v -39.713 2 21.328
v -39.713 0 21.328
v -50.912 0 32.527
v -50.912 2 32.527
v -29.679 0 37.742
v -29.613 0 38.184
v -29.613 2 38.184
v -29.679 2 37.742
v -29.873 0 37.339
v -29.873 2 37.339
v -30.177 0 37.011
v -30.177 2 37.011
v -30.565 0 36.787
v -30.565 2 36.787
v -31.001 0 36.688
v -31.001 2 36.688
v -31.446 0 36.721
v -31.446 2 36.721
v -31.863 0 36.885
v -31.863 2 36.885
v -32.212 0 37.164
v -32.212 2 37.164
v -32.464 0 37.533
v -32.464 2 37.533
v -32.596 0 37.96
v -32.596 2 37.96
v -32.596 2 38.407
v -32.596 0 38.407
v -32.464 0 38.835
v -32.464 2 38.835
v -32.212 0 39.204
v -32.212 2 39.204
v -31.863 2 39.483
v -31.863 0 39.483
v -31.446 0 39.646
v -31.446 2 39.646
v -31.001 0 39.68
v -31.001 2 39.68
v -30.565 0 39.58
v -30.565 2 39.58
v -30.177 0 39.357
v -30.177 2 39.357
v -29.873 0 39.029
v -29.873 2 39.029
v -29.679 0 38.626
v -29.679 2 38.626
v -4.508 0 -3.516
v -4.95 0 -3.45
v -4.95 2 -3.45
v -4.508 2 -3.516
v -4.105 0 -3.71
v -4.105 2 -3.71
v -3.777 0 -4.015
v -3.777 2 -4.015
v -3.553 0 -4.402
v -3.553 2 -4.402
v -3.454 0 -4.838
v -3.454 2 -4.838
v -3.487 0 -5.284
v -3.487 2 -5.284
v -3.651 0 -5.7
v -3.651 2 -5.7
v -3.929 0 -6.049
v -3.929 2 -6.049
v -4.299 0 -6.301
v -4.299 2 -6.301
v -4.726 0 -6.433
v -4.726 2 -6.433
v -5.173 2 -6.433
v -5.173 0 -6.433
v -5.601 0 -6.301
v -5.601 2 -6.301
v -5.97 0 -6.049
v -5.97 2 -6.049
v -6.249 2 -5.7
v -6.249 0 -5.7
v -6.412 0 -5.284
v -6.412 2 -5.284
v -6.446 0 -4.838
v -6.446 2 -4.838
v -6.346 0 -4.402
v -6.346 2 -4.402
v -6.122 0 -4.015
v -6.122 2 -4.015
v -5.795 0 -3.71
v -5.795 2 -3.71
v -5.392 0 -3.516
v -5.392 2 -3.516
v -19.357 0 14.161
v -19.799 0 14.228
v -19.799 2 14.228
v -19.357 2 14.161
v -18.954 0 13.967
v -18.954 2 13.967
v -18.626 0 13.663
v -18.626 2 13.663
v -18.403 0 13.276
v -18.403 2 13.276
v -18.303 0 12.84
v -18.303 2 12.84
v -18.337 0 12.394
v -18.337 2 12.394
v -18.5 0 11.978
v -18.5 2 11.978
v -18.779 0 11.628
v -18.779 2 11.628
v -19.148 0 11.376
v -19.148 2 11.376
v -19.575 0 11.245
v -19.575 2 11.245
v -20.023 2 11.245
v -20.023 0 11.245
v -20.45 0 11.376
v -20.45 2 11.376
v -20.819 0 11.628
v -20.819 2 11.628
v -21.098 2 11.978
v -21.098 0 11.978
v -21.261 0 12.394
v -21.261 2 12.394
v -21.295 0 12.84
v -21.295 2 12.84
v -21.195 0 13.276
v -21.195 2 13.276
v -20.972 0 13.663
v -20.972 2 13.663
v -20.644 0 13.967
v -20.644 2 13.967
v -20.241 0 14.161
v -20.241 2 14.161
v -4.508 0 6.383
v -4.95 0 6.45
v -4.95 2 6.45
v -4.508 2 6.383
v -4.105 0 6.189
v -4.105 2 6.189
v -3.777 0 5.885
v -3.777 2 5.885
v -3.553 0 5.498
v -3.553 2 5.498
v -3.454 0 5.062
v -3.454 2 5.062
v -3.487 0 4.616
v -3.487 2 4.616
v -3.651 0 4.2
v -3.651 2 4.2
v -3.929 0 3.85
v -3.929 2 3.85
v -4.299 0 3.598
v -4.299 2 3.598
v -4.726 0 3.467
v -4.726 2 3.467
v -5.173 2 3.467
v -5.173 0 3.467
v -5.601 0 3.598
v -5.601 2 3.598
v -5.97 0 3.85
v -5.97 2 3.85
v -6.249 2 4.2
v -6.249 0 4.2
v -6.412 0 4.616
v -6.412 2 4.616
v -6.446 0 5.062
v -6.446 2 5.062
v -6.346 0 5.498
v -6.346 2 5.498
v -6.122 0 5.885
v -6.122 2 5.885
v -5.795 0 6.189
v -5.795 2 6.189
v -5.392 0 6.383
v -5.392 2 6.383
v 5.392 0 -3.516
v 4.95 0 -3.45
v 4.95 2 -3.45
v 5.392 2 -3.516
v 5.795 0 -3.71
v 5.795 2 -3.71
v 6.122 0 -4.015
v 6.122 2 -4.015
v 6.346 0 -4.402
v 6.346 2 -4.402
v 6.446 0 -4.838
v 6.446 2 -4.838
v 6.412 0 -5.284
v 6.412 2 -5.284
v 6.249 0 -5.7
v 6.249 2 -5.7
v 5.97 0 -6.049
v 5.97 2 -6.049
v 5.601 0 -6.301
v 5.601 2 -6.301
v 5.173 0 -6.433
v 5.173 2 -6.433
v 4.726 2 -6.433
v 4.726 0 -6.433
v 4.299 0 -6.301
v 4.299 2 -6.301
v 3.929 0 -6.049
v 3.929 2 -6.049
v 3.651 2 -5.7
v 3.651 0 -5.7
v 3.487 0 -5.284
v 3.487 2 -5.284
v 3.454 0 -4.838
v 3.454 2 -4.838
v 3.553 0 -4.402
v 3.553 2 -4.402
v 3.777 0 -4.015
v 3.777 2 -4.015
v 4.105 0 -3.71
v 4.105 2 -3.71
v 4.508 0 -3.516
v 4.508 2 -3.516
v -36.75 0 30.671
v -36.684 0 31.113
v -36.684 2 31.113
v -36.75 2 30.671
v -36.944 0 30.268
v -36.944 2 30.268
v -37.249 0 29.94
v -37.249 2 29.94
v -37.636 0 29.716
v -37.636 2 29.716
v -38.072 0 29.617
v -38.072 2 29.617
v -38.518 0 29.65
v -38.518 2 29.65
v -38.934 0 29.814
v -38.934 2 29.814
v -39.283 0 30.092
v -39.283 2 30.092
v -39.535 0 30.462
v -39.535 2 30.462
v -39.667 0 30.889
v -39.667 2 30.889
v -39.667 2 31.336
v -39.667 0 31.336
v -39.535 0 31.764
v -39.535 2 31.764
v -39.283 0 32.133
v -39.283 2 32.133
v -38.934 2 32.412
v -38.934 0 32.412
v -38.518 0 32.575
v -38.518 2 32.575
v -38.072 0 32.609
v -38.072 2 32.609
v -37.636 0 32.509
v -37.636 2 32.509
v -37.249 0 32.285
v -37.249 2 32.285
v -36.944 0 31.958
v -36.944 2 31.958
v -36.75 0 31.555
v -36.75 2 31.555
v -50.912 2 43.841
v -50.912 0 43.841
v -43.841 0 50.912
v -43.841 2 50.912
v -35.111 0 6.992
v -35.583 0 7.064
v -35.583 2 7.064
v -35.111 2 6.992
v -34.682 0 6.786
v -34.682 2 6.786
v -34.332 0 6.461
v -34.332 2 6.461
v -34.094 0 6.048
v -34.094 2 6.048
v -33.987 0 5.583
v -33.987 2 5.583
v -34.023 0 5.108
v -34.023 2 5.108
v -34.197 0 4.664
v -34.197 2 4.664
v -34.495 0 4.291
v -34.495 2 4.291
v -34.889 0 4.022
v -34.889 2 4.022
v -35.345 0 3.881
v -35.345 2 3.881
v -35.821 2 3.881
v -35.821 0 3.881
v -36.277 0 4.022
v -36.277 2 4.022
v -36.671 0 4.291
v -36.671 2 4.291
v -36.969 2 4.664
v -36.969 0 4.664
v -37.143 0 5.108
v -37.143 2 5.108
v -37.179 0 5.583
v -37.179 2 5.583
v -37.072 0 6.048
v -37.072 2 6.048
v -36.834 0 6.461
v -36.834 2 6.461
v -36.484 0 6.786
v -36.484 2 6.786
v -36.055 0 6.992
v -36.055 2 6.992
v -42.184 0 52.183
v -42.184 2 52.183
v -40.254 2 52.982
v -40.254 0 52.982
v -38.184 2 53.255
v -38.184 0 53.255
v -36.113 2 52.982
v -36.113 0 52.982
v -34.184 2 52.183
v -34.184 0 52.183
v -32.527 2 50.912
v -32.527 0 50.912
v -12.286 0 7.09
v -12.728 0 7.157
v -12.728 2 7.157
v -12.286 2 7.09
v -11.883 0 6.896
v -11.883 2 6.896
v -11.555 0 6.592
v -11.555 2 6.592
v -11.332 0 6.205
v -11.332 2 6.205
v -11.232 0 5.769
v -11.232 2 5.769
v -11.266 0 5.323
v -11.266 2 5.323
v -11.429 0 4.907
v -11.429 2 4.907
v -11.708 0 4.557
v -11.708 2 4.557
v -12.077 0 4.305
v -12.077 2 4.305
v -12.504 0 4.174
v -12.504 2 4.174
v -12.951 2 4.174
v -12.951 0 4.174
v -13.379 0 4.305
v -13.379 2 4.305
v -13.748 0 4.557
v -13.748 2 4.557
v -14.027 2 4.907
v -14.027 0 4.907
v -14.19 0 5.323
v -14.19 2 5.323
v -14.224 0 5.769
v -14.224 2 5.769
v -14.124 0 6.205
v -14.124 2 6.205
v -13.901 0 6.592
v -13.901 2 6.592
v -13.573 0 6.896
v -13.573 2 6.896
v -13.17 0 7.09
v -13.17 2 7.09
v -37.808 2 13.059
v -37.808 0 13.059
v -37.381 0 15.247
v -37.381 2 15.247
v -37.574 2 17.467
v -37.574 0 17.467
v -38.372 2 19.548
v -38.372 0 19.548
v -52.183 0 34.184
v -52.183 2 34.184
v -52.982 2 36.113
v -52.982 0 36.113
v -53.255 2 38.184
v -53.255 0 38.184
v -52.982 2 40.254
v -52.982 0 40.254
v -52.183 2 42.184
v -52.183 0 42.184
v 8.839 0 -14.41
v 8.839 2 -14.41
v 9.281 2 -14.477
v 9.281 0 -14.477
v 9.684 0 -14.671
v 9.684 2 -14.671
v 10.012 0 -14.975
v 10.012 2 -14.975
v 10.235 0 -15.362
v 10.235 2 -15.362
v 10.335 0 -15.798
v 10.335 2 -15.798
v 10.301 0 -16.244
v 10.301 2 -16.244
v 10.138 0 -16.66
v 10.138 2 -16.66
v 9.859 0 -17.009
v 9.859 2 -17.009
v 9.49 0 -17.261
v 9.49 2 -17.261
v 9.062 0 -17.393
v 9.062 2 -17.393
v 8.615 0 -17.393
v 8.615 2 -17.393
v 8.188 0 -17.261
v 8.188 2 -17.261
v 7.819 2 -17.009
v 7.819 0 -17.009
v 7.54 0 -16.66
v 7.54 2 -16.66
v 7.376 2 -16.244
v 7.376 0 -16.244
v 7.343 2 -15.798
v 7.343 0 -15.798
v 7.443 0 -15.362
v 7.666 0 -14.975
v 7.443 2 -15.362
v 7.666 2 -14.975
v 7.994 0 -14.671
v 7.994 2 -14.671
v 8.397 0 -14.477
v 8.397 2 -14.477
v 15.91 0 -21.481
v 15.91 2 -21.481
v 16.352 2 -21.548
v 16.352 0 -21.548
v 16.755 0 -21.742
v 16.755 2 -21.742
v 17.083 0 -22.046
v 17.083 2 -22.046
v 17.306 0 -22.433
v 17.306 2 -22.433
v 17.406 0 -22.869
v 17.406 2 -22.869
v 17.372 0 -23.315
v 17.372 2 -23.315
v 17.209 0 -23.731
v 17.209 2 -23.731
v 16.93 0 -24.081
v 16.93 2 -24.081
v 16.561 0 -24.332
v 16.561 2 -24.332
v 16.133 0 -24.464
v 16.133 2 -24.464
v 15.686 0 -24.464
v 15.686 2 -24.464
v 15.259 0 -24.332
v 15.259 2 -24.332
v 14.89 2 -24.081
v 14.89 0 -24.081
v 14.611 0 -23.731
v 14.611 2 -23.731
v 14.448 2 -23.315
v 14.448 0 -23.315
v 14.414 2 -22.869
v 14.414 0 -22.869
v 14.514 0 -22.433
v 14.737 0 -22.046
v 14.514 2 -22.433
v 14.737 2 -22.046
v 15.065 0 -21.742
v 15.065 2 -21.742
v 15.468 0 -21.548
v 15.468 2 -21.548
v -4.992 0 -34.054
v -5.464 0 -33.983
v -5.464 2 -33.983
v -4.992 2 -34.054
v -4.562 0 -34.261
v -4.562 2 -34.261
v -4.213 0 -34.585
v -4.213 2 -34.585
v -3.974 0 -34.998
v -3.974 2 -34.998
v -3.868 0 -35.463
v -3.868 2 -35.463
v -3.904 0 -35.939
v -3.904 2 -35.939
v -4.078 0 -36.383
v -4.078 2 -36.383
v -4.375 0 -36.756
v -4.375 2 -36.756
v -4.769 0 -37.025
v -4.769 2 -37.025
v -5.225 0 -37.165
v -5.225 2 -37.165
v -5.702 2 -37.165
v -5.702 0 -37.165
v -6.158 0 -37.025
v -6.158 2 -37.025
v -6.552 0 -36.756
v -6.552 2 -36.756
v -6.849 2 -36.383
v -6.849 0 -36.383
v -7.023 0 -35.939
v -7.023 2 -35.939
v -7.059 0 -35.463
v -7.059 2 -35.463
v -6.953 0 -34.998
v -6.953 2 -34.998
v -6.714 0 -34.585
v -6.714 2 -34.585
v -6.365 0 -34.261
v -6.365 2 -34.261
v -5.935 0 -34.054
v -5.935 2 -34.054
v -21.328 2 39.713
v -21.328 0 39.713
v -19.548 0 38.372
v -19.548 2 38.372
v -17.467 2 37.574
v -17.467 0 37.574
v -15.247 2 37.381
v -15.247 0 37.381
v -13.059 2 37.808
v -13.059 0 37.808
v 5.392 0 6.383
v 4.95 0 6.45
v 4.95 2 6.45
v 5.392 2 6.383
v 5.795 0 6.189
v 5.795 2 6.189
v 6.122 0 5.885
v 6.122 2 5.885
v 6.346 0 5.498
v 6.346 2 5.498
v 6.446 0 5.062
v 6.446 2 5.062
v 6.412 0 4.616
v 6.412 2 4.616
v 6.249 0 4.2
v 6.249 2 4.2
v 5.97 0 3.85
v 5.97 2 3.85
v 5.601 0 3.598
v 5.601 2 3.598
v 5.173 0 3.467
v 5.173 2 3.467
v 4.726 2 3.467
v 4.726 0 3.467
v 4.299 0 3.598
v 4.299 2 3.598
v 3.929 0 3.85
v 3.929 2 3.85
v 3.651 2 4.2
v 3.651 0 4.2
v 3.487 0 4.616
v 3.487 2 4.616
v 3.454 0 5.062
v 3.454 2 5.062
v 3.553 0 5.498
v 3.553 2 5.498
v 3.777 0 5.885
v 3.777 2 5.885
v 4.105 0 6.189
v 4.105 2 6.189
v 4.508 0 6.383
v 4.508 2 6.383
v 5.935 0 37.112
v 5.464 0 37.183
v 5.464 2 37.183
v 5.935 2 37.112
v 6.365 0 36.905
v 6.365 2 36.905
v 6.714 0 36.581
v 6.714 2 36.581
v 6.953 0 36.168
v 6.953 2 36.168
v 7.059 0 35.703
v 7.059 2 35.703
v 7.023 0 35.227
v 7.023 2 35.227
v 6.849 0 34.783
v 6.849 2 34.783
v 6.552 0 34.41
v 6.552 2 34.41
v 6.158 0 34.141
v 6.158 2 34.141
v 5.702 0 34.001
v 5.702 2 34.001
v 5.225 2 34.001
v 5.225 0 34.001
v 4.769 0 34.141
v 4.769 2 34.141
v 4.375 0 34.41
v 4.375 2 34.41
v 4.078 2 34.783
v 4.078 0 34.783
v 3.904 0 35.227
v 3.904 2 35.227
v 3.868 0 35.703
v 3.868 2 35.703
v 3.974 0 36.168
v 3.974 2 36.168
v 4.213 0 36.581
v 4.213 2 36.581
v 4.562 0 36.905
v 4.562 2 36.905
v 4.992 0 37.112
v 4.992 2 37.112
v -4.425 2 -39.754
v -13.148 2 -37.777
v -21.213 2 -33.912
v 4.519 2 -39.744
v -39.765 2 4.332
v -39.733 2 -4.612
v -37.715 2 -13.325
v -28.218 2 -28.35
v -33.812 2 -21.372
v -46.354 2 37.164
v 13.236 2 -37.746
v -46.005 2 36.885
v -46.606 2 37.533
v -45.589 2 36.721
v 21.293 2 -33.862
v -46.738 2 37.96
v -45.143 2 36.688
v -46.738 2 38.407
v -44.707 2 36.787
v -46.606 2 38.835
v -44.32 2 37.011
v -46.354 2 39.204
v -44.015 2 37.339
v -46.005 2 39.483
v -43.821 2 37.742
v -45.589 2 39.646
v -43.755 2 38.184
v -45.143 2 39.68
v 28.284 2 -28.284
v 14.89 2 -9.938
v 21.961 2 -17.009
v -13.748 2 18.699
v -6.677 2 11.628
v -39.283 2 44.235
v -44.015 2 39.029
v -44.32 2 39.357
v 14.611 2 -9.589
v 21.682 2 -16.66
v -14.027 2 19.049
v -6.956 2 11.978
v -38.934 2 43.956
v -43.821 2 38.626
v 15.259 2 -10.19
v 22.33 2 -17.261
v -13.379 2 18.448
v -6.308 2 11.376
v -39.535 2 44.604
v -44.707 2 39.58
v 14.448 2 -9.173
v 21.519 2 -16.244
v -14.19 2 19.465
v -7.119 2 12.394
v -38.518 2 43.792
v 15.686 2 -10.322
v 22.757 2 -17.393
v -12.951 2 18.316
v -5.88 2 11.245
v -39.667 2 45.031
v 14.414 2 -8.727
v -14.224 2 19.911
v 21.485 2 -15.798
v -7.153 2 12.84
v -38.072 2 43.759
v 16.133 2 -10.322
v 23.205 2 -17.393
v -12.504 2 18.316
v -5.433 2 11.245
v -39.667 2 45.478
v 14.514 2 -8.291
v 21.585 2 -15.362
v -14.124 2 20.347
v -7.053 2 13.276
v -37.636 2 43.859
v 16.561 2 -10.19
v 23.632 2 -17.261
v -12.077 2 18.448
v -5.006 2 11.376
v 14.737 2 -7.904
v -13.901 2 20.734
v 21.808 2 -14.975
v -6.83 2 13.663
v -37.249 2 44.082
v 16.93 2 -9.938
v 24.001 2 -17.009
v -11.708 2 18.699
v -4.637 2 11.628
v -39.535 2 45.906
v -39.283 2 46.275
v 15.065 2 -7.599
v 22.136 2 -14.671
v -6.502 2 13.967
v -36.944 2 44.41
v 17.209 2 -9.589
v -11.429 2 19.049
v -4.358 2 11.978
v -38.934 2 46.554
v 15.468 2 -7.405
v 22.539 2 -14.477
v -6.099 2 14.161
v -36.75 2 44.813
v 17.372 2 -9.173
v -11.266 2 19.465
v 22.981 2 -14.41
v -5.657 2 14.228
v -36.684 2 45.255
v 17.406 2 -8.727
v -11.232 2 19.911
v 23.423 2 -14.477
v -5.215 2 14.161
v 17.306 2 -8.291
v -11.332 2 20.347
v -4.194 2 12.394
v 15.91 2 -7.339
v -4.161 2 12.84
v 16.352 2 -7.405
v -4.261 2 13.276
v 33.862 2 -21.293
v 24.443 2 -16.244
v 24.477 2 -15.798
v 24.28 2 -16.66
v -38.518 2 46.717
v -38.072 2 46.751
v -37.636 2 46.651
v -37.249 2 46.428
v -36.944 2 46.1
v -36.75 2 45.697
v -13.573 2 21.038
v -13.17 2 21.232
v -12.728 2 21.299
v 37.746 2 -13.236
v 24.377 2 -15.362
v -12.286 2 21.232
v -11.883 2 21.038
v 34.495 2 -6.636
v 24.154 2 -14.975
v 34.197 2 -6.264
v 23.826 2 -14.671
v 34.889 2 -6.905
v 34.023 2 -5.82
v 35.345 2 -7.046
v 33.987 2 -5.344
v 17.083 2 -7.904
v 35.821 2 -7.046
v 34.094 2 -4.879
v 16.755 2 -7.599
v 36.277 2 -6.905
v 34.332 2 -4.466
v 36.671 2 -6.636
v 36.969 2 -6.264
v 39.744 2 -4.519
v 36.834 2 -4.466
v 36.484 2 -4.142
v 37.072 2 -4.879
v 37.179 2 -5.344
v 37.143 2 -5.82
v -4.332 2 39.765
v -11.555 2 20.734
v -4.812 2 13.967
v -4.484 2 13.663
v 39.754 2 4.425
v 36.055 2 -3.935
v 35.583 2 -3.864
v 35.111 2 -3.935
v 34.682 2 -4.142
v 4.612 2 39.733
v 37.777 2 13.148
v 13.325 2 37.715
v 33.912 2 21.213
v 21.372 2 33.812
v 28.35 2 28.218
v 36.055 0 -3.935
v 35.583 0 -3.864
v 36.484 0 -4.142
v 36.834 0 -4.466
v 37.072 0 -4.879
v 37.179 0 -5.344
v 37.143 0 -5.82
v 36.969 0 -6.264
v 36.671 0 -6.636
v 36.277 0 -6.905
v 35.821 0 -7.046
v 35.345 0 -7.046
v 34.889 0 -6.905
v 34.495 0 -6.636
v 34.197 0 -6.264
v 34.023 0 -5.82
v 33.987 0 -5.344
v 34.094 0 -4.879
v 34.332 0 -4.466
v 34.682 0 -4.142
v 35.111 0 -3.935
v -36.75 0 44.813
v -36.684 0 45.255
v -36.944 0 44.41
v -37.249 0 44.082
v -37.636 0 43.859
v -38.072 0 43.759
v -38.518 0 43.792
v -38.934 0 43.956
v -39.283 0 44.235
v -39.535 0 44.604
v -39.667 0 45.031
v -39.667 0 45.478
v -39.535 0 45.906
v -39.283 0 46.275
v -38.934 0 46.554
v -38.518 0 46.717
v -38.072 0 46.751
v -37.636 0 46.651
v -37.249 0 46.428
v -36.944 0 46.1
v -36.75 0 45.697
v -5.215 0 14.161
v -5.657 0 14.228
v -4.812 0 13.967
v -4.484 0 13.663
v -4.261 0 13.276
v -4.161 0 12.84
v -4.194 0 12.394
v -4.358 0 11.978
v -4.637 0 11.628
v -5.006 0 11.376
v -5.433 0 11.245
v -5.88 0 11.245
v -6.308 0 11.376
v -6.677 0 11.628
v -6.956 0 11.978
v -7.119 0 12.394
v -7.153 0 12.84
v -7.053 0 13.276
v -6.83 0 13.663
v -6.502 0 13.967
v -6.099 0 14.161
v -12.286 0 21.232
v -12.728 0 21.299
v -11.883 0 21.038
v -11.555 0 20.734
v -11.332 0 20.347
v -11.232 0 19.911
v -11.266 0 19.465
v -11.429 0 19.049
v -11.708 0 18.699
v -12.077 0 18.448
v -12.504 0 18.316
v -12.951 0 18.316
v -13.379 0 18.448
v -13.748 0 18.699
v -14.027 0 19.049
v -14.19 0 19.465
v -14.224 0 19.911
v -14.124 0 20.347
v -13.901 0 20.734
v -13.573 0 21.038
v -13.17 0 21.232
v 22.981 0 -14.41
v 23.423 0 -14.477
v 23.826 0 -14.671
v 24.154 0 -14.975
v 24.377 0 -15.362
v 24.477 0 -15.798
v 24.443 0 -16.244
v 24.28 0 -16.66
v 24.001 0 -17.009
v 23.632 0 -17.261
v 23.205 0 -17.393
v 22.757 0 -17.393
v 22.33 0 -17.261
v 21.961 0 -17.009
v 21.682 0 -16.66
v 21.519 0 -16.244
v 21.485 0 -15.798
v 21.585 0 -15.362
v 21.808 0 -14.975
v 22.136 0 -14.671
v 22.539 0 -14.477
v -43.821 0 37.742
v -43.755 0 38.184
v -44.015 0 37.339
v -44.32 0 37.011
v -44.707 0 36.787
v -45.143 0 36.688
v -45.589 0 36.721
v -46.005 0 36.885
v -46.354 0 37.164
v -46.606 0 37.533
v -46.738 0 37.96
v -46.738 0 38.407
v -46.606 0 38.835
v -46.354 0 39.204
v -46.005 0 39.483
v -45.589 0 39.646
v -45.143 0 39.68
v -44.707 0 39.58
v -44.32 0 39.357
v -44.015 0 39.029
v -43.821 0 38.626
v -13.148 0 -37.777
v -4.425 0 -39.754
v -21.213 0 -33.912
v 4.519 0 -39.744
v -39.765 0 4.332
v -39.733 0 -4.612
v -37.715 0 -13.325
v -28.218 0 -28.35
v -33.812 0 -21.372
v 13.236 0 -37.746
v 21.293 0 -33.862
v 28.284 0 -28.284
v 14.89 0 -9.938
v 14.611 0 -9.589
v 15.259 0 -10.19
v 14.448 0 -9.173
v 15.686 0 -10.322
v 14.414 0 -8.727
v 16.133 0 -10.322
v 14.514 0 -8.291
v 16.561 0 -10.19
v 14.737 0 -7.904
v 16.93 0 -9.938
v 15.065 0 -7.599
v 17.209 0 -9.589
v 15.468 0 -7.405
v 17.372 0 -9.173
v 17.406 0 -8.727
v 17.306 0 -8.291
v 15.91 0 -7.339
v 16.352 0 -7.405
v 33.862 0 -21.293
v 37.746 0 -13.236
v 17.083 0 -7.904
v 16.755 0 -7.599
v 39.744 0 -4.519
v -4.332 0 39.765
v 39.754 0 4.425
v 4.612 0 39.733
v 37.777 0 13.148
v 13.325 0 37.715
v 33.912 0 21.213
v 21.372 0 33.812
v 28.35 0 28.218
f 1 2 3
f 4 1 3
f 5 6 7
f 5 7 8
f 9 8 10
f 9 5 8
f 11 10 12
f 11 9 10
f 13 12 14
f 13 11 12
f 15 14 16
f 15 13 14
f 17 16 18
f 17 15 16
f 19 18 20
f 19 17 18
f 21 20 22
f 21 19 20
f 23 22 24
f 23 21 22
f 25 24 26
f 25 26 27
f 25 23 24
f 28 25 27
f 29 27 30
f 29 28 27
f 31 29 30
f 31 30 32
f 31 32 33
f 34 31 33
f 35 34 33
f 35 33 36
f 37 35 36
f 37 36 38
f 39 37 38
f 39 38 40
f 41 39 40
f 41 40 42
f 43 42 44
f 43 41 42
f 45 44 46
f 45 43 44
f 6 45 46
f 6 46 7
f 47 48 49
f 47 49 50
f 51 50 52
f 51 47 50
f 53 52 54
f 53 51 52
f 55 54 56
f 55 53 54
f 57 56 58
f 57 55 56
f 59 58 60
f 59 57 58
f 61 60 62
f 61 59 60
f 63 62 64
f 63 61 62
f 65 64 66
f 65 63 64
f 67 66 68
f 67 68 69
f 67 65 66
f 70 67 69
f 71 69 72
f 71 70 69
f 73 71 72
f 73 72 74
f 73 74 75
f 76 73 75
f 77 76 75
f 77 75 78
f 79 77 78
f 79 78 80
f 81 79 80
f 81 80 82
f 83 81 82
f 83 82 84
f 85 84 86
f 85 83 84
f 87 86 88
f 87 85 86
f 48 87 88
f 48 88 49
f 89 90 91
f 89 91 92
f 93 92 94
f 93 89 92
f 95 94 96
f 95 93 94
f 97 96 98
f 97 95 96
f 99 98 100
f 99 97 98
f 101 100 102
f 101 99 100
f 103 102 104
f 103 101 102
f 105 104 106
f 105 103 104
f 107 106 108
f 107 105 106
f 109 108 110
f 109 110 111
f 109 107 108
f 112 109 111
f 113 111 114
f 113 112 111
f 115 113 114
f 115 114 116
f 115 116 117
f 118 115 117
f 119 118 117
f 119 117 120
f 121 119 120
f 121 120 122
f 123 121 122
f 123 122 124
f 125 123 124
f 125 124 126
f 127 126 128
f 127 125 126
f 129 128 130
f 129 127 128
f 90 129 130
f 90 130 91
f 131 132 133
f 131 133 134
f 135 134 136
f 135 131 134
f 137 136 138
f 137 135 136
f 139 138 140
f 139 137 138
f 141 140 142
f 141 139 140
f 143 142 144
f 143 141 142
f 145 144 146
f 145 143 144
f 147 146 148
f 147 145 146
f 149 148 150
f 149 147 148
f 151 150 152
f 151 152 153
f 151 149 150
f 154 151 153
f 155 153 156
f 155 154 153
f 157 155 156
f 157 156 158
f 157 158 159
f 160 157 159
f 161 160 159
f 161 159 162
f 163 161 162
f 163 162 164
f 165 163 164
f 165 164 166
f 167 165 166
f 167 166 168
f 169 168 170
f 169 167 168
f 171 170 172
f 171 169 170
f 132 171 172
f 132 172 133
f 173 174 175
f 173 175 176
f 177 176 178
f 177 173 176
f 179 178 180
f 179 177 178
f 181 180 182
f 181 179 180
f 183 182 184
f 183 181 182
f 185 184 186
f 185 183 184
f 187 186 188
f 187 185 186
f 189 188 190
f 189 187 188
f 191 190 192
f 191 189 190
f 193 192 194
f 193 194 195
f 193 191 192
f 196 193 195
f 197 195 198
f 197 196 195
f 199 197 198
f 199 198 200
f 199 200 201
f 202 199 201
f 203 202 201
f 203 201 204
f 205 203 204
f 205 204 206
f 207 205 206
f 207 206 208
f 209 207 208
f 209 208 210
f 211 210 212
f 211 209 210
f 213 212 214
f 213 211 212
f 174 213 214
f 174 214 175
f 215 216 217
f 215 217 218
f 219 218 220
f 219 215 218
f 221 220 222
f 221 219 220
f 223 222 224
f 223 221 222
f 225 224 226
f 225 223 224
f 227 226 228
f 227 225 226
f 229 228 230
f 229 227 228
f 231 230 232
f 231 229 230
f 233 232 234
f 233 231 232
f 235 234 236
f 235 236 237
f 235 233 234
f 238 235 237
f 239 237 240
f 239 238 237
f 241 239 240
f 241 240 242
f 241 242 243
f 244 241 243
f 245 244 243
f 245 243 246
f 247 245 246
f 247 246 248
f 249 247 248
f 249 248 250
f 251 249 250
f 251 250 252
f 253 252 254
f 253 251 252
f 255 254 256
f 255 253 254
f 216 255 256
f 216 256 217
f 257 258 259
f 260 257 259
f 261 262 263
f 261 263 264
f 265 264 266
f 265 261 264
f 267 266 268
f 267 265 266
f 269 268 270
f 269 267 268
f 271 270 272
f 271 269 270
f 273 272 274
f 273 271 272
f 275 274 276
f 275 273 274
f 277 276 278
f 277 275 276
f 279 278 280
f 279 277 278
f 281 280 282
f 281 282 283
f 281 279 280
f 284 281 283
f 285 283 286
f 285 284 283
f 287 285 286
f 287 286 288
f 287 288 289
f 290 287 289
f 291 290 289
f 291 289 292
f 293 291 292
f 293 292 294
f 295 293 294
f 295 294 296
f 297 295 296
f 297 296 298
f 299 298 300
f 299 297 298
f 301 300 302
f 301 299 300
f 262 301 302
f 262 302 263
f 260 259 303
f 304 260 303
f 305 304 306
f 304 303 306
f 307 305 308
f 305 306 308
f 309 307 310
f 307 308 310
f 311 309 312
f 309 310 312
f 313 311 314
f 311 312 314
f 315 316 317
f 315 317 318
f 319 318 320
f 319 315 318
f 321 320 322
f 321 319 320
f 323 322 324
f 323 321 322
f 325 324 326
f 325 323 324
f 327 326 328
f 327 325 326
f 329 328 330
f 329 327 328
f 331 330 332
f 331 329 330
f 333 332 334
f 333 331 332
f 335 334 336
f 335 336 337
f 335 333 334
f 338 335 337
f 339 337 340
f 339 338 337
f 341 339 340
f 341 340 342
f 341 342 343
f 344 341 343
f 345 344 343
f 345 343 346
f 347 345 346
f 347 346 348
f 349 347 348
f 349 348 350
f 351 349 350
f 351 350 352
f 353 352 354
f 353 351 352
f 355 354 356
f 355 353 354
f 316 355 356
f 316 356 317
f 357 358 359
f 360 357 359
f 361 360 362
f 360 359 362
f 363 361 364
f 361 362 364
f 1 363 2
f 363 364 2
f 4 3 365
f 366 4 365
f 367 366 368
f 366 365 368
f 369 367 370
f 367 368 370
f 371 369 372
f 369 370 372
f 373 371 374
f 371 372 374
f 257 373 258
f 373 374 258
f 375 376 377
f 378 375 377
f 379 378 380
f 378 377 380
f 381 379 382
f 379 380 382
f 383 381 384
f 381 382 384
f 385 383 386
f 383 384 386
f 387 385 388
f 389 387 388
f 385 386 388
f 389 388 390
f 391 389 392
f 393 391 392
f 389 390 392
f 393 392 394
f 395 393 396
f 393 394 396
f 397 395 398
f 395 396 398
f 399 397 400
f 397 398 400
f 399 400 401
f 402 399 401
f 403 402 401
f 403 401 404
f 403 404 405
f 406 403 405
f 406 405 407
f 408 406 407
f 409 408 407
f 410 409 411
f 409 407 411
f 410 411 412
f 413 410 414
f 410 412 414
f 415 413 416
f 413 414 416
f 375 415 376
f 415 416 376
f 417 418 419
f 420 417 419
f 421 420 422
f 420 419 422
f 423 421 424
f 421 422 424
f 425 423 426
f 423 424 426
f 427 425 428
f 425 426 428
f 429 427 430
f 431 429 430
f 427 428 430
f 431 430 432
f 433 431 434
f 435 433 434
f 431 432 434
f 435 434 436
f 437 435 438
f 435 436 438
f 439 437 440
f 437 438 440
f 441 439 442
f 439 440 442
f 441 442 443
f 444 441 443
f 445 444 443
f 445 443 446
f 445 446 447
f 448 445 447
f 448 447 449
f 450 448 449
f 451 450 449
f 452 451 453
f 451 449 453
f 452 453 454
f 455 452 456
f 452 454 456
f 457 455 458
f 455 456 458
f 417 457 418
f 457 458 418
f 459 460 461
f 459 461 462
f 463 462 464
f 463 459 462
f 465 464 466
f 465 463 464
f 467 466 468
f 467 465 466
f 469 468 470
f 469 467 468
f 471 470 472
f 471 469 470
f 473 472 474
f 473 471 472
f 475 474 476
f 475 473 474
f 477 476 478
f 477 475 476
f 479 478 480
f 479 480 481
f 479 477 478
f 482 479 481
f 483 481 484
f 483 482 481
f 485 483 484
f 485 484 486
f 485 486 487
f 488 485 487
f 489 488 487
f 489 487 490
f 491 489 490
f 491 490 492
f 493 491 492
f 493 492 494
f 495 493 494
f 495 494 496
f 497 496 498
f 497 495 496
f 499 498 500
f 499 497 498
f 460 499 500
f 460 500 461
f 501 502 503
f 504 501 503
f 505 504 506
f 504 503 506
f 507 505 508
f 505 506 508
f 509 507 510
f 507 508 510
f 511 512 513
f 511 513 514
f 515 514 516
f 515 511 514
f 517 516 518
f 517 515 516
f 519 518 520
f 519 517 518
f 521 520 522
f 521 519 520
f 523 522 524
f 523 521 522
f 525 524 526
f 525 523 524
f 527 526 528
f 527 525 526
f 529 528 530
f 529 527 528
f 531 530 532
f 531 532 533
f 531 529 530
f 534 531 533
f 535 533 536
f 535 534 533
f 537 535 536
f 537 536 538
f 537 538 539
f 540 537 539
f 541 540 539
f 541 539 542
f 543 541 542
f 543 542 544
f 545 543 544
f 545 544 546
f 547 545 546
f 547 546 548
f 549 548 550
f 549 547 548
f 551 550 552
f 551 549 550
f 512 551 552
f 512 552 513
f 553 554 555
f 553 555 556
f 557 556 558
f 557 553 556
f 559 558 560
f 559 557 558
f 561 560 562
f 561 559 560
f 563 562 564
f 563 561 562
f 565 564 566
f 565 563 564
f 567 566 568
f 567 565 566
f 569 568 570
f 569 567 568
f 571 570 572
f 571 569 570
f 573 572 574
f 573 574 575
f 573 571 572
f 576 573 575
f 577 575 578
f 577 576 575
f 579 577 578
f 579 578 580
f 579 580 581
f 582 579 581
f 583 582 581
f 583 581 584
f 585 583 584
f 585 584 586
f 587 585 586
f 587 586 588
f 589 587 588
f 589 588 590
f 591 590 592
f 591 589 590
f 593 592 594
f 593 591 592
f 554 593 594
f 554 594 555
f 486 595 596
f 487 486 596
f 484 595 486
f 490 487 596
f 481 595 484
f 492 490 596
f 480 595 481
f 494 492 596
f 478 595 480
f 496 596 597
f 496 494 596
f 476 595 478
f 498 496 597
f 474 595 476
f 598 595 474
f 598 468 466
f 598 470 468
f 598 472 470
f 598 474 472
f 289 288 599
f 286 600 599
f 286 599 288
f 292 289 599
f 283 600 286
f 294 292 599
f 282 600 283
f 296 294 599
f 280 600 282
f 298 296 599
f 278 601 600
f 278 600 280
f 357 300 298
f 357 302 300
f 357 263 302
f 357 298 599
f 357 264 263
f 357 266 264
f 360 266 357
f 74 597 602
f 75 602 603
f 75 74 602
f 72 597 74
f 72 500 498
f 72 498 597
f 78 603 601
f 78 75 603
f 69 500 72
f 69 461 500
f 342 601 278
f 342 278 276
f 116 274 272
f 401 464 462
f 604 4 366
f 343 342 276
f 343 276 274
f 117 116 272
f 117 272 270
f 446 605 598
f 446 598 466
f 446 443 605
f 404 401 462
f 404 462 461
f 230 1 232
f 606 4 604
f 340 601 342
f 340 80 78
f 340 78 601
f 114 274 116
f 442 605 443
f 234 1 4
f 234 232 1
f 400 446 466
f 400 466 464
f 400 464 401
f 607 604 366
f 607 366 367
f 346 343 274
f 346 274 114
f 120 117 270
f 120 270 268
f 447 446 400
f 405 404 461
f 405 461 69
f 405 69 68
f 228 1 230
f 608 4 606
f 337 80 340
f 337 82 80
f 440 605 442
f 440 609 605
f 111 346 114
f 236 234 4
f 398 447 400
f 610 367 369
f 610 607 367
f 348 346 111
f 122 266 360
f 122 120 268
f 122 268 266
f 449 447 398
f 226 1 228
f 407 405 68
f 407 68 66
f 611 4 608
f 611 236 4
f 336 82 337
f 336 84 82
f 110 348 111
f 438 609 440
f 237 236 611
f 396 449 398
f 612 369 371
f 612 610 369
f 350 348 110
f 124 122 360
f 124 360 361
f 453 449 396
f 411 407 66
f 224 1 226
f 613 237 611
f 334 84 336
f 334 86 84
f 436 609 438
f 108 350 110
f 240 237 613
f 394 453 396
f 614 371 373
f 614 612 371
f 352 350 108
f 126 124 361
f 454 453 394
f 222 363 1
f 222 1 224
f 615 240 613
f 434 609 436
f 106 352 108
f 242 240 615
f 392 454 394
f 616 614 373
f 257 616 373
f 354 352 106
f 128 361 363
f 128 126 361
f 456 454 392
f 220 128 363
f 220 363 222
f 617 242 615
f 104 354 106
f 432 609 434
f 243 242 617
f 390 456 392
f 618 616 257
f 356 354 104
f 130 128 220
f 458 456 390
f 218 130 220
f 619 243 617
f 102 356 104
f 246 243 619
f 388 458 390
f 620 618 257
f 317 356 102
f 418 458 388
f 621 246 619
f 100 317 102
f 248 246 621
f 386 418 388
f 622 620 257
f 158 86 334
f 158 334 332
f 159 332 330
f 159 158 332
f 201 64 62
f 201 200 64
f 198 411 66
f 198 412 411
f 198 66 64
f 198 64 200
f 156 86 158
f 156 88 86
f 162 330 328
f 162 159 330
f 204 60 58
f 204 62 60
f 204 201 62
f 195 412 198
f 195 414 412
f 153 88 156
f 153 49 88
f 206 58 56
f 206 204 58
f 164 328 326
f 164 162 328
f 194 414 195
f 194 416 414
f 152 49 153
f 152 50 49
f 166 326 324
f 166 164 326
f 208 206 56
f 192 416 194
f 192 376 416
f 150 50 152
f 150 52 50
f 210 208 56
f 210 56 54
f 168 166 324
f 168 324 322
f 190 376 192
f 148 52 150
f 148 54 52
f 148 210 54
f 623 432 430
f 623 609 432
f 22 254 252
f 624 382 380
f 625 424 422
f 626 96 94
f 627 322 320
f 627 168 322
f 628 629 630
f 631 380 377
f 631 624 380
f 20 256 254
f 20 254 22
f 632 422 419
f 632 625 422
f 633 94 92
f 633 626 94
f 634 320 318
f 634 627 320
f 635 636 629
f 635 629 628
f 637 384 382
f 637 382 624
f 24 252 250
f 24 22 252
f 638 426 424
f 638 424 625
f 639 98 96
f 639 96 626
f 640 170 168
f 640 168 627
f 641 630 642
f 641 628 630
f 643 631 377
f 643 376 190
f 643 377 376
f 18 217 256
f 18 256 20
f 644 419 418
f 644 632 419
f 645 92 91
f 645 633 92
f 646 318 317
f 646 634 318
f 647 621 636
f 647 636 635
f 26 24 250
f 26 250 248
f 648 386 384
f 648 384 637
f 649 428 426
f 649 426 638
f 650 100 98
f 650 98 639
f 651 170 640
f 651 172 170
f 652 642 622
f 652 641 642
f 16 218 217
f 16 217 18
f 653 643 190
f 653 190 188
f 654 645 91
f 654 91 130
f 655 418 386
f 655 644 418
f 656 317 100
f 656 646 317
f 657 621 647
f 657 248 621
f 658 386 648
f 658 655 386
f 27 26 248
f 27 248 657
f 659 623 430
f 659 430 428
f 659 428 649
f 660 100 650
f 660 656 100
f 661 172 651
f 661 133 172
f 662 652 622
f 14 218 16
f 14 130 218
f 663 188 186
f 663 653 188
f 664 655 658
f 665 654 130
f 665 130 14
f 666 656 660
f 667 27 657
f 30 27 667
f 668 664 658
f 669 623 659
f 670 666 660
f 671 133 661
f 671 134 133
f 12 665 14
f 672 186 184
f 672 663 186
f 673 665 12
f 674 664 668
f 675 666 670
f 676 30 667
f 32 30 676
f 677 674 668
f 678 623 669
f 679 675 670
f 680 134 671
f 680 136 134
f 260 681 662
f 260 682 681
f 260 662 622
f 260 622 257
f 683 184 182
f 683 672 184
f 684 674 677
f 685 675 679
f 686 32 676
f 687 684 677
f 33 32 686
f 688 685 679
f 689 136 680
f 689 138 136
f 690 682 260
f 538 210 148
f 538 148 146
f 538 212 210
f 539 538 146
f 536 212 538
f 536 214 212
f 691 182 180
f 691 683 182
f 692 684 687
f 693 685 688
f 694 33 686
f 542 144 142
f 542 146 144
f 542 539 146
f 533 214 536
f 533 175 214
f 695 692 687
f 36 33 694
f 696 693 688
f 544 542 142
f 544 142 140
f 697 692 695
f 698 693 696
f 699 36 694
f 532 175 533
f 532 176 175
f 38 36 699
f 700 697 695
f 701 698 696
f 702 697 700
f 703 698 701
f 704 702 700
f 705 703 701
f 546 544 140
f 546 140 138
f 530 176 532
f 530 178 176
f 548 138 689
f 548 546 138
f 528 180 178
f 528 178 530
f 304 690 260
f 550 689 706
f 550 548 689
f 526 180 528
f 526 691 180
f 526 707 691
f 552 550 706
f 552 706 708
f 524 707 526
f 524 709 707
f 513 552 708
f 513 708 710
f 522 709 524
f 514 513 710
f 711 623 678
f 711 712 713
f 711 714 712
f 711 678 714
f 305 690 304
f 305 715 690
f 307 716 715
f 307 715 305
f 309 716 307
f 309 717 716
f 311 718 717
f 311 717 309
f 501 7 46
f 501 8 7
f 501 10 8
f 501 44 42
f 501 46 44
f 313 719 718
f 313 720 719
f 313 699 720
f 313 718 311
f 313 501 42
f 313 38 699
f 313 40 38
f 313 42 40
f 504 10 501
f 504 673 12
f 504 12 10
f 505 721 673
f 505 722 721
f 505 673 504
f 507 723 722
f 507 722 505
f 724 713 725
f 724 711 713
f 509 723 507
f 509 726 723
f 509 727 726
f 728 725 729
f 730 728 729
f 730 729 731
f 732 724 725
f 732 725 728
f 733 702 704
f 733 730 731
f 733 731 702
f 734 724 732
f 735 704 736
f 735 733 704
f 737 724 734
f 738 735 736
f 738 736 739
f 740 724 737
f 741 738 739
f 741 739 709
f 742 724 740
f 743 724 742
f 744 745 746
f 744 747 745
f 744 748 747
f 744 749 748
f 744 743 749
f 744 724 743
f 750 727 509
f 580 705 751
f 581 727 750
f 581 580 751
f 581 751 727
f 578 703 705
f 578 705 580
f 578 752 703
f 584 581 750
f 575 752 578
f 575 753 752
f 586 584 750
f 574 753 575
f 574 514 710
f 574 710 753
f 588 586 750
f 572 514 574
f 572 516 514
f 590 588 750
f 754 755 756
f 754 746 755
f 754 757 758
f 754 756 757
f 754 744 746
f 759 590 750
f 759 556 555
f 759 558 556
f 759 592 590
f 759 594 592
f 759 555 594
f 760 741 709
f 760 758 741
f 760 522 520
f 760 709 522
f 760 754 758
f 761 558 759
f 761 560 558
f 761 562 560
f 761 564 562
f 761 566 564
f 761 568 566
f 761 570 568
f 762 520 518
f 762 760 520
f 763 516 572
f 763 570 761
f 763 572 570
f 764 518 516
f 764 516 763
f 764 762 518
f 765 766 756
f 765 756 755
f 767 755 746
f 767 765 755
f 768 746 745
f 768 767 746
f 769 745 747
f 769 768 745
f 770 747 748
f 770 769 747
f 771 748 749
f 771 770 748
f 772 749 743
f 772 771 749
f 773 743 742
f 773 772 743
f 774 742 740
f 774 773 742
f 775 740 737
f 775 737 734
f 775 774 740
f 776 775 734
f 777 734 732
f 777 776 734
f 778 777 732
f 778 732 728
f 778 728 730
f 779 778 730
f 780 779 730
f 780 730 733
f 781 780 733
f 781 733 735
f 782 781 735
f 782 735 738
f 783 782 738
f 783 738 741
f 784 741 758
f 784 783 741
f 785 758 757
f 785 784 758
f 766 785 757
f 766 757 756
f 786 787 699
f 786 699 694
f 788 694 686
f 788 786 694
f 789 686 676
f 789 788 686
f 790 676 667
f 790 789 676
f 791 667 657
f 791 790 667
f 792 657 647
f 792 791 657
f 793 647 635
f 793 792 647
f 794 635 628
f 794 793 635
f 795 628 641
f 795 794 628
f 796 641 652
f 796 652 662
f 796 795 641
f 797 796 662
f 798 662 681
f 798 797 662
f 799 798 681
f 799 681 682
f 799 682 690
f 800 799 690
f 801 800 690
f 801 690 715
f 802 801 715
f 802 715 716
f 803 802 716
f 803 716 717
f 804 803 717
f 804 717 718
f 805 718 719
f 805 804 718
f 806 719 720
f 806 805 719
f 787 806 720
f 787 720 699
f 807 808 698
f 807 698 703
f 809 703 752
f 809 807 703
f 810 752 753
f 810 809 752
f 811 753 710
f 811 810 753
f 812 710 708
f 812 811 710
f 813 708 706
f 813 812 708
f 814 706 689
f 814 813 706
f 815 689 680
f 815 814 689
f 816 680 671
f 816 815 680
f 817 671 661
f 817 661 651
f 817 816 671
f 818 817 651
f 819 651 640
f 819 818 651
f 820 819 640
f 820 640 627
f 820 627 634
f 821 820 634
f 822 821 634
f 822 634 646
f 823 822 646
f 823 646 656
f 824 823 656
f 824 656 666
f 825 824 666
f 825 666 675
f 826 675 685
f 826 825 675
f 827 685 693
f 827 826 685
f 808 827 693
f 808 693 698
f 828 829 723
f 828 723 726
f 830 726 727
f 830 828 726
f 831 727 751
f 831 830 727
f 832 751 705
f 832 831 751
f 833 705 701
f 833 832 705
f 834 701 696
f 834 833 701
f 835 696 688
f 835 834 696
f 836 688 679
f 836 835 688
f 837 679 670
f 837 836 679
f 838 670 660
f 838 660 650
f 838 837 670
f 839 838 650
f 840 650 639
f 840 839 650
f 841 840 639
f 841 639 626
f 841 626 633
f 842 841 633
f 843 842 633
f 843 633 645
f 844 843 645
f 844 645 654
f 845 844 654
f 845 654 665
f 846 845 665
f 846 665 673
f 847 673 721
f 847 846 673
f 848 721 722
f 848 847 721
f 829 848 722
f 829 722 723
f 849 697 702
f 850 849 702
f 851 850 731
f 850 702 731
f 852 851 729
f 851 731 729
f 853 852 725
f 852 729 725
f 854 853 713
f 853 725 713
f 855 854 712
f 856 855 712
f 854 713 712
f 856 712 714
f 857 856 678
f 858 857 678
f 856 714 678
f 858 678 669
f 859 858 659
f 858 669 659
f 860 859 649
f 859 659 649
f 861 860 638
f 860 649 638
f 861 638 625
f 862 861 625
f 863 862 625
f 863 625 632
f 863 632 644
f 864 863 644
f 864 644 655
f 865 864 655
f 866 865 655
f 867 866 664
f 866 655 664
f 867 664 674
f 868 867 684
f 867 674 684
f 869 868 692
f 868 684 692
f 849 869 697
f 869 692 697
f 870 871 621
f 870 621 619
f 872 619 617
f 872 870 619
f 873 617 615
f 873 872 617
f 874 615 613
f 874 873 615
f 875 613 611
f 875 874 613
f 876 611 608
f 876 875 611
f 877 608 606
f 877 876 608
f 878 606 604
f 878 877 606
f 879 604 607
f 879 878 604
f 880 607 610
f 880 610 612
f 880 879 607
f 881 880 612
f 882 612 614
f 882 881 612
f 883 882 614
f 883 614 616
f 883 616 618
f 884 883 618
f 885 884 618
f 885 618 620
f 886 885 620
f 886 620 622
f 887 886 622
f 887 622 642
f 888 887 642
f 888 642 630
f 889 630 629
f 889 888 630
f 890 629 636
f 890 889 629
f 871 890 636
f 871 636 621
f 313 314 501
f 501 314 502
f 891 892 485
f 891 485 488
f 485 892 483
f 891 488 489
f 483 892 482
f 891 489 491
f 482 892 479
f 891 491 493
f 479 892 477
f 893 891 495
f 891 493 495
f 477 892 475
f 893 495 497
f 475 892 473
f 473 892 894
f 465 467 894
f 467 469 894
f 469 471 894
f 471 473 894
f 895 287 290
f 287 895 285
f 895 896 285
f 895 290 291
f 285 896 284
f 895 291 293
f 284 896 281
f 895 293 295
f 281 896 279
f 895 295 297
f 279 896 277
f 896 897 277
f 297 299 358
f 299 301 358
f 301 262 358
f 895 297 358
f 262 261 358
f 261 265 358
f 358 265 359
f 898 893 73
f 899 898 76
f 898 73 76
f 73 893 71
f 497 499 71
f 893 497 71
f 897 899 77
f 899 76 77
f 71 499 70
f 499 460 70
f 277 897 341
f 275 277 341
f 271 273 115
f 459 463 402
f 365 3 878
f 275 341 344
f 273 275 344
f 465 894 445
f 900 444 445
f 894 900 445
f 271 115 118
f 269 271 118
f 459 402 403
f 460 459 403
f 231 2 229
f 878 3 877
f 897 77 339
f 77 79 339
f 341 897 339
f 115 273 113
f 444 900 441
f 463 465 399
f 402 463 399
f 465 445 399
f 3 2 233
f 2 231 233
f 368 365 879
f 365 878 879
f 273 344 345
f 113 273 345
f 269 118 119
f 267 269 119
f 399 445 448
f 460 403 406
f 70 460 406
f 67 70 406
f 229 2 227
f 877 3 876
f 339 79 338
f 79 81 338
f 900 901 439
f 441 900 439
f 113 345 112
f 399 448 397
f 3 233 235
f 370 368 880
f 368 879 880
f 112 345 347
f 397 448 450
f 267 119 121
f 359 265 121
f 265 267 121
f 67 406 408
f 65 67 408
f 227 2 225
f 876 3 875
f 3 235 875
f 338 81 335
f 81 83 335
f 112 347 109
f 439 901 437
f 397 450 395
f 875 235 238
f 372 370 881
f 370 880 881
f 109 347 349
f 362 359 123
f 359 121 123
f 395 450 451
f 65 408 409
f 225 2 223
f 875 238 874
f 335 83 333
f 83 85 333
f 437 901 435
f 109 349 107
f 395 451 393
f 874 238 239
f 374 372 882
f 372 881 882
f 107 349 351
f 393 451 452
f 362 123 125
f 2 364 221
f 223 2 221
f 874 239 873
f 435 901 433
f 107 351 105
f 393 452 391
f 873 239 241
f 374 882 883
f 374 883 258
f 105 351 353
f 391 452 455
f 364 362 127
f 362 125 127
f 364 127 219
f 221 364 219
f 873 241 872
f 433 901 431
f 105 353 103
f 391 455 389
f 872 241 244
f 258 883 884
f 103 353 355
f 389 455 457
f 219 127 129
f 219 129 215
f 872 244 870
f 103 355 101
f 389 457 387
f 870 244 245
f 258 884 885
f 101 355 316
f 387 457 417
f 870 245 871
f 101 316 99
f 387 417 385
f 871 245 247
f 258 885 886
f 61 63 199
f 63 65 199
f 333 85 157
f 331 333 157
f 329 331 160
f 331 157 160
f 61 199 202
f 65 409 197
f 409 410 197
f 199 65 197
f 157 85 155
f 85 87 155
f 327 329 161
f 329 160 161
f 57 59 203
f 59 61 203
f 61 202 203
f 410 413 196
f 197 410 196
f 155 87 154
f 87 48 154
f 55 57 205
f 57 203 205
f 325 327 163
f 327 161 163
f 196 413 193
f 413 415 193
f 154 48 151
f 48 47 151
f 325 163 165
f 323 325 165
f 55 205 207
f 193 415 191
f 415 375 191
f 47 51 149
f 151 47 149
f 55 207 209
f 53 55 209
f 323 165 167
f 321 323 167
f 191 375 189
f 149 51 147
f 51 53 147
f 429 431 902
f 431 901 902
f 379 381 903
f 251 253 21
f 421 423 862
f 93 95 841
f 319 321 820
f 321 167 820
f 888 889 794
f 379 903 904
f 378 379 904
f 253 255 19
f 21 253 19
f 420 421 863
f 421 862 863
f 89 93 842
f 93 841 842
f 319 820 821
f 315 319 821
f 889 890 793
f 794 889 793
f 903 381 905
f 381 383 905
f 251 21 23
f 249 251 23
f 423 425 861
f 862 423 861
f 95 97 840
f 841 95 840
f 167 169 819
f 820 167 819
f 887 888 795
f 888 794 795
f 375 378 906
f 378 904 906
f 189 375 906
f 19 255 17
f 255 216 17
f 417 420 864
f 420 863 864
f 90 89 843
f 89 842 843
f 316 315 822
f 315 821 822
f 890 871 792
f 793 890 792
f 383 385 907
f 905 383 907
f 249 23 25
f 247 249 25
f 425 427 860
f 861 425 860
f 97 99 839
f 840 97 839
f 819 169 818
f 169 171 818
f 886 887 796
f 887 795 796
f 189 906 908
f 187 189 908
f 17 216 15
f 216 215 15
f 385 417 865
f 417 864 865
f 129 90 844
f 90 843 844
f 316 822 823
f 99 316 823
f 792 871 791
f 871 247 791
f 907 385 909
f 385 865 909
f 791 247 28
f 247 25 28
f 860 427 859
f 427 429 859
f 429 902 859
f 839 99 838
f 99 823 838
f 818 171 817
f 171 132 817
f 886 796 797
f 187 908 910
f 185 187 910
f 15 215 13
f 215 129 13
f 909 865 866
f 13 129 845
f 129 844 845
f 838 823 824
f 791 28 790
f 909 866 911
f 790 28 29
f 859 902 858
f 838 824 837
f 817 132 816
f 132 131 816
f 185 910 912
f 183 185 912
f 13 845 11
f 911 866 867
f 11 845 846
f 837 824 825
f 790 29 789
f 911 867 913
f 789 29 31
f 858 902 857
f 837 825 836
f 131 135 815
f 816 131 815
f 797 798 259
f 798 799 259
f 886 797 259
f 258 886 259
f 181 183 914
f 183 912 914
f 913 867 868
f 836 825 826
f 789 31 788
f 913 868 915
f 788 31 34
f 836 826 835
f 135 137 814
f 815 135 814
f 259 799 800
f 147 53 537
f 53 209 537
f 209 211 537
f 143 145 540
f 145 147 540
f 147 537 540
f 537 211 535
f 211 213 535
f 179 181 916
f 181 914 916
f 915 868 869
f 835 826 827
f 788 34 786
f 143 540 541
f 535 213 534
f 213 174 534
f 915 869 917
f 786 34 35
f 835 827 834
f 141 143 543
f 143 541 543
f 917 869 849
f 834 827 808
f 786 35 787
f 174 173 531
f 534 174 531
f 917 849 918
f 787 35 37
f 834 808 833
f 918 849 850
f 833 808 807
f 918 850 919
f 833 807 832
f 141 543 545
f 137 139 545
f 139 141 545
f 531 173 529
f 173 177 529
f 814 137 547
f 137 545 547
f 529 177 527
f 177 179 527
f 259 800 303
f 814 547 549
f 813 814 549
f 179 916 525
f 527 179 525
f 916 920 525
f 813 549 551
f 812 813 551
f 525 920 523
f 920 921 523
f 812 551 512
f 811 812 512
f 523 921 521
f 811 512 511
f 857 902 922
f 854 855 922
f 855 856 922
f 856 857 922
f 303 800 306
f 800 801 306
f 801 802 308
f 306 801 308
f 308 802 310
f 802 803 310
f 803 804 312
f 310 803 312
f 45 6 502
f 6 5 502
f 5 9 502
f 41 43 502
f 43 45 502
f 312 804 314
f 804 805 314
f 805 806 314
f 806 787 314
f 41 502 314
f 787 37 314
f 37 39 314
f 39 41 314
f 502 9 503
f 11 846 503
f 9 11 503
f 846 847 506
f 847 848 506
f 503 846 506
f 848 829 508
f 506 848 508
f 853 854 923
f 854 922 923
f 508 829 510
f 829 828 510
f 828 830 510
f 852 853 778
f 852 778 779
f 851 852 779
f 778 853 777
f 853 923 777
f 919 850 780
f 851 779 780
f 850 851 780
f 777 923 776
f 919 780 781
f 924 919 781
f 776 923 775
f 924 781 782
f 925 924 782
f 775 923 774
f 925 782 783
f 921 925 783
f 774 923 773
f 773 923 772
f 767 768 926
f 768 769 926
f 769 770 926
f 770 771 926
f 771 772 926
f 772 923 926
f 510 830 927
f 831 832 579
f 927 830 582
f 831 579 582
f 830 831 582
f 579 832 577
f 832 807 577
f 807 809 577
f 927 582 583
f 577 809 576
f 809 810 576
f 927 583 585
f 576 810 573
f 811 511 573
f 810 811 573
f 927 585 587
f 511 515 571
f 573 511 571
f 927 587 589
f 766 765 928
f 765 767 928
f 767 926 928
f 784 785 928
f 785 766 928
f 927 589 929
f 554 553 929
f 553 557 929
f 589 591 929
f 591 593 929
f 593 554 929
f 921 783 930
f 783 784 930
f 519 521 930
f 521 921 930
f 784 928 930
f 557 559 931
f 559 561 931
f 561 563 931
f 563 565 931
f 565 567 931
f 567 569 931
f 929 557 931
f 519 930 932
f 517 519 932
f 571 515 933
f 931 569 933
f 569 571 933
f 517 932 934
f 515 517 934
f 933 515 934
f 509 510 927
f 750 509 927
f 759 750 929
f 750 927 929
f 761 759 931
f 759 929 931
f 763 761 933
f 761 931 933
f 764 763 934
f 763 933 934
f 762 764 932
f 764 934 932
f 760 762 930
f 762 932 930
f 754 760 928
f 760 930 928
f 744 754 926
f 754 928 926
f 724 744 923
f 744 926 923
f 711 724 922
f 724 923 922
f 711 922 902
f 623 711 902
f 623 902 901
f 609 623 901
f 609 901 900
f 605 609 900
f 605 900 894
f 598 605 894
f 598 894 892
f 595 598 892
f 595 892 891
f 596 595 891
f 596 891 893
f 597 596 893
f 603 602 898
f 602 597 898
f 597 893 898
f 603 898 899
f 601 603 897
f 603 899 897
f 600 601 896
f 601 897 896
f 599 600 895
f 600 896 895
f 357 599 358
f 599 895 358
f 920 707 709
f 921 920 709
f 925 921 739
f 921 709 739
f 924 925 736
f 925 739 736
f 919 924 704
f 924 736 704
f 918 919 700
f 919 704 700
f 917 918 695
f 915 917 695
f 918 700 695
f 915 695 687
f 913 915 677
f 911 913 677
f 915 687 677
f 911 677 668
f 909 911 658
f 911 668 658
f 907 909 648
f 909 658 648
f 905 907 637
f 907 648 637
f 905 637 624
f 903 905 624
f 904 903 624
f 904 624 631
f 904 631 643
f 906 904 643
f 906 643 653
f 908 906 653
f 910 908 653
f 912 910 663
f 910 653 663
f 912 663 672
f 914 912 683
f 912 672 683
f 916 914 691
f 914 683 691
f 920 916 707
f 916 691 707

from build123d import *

# Parameters (mm, degrees)
SKETCH_1_R          = 40
SKETCH_1_R_2        = 1.5
SKETCH_1_R_3        = 1.6
EXTRUDE_9_DEPTH     = 2
SKETCH_2_R          = 1.5
CUT_EXTRUDE_1_DEPTH = 2
FILLET_2_OUTLINE_R  = 1.5
FILLET_2_DEPTH      = 2


with BuildPart() as part:
    # 草图1 → 凸台-拉伸9 (new body)
    with BuildSketch(Plane(origin=(0, 0, 0), x_dir=(1, 0, 0), z_dir=(0, 1, 0))):
        with Locations(Location((0, 0, 0), (0, 0, 270))):
            Circle(SKETCH_1_R)
        with Locations(Location((-12.727922062, -5.656854248, 0), (0, 0, 270))):
            Circle(SKETCH_1_R_2, mode=Mode.SUBTRACT)
        with Locations(Location((-5.656854248, -12.727922062, 0), (0, 0, 270))):
            Circle(SKETCH_1_R_2, mode=Mode.SUBTRACT)
        with Locations(Location((-19.798989874, -12.727922061, 0), (0, 0, 270))):
            Circle(SKETCH_1_R_2, mode=Mode.SUBTRACT)
        with Locations(Location((-12.727922061, -19.798989874, 0), (0, 0, 270))):
            Circle(SKETCH_1_R_2, mode=Mode.SUBTRACT)
        with Locations(Location((4.949747468, 4.949747468, 0), (0, 0, 270))):
            Circle(SKETCH_1_R_2, mode=Mode.SUBTRACT)
        with Locations(Location((-4.949747468, 4.949747468, 0), (0, 0, 270))):
            Circle(SKETCH_1_R_2, mode=Mode.SUBTRACT)
        with Locations(Location((-4.949747468, -4.949747468, 0), (0, 0, 270))):
            Circle(SKETCH_1_R_2, mode=Mode.SUBTRACT)
        with Locations(Location((4.949747468, -4.949747468, 0), (0, 0, 270))):
            Circle(SKETCH_1_R_2, mode=Mode.SUBTRACT)
        with Locations(Location((35.582997469, 5.463541991, 0), (0, 0, 270))):
            Circle(SKETCH_1_R_3, mode=Mode.SUBTRACT)
        with Locations(Location((5.463541991, -35.582997469, 0), (0, 0, 270))):
            Circle(SKETCH_1_R_3, mode=Mode.SUBTRACT)
        with Locations(Location((-35.582997469, -5.463541991, 0), (0, 0, 270))):
            Circle(SKETCH_1_R_3, mode=Mode.SUBTRACT)
        with Locations(Location((-5.463541991, 35.582997469, 0), (0, 0, 270))):
            Circle(SKETCH_1_R_3, mode=Mode.SUBTRACT)
    extrude(amount=EXTRUDE_9_DEPTH)

    # 草图2 → 切除-拉伸1 (cut)
    with BuildSketch(Plane(origin=(0, 2, 0), x_dir=(1, 0, 0), z_dir=(0, 1, 0))):
        with Locations(Location((8.838834765, 15.909902577, 0), (0, 0, 270))):
            Circle(SKETCH_2_R)
        with Locations(Location((15.909902577, 8.838834765, 0), (0, 0, 270))):
            Circle(SKETCH_2_R)
        with Locations(Location((15.909902576, 22.980970389, 0), (0, 0, 270))):
            Circle(SKETCH_2_R)
        with Locations(Location((22.980970389, 15.909902576, 0), (0, 0, 270))):
            Circle(SKETCH_2_R)
    extrude(amount=-CUT_EXTRUDE_1_DEPTH, mode=Mode.SUBTRACT)

    # 圆角2: read off the stored shape, not the designer's step
    # 圆角2 outline → 圆角2 (add)
    with BuildSketch(Plane(origin=(0, 0, 0), x_dir=(1, 0, 0), z_dir=(0, 1, 0))):
        with BuildLine():
            ThreePointArc((-37.808106107, -13.059368767), (-37.573895805, -17.467074044), (-39.712873079, -21.32809677))
            Line((-39.712873079, -21.32809677), (-50.911688244, -32.526911935))
            ThreePointArc((-50.911688244, -32.526911935), (-53.254833995, -38.183766185), (-50.911688244, -43.840620434))
            Line((-50.911688244, -43.840620434), (-43.840620432, -50.911688246))
            ThreePointArc((-43.840620432, -50.911688246), (-38.183766183, -53.254833997), (-32.526911933, -50.911688246))
            Line((-32.526911933, -50.911688246), (-21.328096767, -39.71287308))
            ThreePointArc((-21.328096767, -39.71287308), (-17.467074041, -37.573895806), (-13.059368765, -37.808106108))
            ThreePointArc((-13.059368765, -37.808106108), (-28.284271247, -28.284271248), (-37.808106107, -13.059368767))
        make_face()
        with Locations((-38.18376618, -45.254833999)):
            Circle(FILLET_2_OUTLINE_R, mode=Mode.SUBTRACT)
        with Locations((-45.254833993, -38.183766188)):
            Circle(FILLET_2_OUTLINE_R, mode=Mode.SUBTRACT)
        with Locations((-31.112698372, -38.183766184)):
            Circle(FILLET_2_OUTLINE_R, mode=Mode.SUBTRACT)
        with Locations((-38.183766184, -31.112698372)):
            Circle(FILLET_2_OUTLINE_R, mode=Mode.SUBTRACT)
    extrude(amount=FILLET_2_DEPTH)


solid = part.part
